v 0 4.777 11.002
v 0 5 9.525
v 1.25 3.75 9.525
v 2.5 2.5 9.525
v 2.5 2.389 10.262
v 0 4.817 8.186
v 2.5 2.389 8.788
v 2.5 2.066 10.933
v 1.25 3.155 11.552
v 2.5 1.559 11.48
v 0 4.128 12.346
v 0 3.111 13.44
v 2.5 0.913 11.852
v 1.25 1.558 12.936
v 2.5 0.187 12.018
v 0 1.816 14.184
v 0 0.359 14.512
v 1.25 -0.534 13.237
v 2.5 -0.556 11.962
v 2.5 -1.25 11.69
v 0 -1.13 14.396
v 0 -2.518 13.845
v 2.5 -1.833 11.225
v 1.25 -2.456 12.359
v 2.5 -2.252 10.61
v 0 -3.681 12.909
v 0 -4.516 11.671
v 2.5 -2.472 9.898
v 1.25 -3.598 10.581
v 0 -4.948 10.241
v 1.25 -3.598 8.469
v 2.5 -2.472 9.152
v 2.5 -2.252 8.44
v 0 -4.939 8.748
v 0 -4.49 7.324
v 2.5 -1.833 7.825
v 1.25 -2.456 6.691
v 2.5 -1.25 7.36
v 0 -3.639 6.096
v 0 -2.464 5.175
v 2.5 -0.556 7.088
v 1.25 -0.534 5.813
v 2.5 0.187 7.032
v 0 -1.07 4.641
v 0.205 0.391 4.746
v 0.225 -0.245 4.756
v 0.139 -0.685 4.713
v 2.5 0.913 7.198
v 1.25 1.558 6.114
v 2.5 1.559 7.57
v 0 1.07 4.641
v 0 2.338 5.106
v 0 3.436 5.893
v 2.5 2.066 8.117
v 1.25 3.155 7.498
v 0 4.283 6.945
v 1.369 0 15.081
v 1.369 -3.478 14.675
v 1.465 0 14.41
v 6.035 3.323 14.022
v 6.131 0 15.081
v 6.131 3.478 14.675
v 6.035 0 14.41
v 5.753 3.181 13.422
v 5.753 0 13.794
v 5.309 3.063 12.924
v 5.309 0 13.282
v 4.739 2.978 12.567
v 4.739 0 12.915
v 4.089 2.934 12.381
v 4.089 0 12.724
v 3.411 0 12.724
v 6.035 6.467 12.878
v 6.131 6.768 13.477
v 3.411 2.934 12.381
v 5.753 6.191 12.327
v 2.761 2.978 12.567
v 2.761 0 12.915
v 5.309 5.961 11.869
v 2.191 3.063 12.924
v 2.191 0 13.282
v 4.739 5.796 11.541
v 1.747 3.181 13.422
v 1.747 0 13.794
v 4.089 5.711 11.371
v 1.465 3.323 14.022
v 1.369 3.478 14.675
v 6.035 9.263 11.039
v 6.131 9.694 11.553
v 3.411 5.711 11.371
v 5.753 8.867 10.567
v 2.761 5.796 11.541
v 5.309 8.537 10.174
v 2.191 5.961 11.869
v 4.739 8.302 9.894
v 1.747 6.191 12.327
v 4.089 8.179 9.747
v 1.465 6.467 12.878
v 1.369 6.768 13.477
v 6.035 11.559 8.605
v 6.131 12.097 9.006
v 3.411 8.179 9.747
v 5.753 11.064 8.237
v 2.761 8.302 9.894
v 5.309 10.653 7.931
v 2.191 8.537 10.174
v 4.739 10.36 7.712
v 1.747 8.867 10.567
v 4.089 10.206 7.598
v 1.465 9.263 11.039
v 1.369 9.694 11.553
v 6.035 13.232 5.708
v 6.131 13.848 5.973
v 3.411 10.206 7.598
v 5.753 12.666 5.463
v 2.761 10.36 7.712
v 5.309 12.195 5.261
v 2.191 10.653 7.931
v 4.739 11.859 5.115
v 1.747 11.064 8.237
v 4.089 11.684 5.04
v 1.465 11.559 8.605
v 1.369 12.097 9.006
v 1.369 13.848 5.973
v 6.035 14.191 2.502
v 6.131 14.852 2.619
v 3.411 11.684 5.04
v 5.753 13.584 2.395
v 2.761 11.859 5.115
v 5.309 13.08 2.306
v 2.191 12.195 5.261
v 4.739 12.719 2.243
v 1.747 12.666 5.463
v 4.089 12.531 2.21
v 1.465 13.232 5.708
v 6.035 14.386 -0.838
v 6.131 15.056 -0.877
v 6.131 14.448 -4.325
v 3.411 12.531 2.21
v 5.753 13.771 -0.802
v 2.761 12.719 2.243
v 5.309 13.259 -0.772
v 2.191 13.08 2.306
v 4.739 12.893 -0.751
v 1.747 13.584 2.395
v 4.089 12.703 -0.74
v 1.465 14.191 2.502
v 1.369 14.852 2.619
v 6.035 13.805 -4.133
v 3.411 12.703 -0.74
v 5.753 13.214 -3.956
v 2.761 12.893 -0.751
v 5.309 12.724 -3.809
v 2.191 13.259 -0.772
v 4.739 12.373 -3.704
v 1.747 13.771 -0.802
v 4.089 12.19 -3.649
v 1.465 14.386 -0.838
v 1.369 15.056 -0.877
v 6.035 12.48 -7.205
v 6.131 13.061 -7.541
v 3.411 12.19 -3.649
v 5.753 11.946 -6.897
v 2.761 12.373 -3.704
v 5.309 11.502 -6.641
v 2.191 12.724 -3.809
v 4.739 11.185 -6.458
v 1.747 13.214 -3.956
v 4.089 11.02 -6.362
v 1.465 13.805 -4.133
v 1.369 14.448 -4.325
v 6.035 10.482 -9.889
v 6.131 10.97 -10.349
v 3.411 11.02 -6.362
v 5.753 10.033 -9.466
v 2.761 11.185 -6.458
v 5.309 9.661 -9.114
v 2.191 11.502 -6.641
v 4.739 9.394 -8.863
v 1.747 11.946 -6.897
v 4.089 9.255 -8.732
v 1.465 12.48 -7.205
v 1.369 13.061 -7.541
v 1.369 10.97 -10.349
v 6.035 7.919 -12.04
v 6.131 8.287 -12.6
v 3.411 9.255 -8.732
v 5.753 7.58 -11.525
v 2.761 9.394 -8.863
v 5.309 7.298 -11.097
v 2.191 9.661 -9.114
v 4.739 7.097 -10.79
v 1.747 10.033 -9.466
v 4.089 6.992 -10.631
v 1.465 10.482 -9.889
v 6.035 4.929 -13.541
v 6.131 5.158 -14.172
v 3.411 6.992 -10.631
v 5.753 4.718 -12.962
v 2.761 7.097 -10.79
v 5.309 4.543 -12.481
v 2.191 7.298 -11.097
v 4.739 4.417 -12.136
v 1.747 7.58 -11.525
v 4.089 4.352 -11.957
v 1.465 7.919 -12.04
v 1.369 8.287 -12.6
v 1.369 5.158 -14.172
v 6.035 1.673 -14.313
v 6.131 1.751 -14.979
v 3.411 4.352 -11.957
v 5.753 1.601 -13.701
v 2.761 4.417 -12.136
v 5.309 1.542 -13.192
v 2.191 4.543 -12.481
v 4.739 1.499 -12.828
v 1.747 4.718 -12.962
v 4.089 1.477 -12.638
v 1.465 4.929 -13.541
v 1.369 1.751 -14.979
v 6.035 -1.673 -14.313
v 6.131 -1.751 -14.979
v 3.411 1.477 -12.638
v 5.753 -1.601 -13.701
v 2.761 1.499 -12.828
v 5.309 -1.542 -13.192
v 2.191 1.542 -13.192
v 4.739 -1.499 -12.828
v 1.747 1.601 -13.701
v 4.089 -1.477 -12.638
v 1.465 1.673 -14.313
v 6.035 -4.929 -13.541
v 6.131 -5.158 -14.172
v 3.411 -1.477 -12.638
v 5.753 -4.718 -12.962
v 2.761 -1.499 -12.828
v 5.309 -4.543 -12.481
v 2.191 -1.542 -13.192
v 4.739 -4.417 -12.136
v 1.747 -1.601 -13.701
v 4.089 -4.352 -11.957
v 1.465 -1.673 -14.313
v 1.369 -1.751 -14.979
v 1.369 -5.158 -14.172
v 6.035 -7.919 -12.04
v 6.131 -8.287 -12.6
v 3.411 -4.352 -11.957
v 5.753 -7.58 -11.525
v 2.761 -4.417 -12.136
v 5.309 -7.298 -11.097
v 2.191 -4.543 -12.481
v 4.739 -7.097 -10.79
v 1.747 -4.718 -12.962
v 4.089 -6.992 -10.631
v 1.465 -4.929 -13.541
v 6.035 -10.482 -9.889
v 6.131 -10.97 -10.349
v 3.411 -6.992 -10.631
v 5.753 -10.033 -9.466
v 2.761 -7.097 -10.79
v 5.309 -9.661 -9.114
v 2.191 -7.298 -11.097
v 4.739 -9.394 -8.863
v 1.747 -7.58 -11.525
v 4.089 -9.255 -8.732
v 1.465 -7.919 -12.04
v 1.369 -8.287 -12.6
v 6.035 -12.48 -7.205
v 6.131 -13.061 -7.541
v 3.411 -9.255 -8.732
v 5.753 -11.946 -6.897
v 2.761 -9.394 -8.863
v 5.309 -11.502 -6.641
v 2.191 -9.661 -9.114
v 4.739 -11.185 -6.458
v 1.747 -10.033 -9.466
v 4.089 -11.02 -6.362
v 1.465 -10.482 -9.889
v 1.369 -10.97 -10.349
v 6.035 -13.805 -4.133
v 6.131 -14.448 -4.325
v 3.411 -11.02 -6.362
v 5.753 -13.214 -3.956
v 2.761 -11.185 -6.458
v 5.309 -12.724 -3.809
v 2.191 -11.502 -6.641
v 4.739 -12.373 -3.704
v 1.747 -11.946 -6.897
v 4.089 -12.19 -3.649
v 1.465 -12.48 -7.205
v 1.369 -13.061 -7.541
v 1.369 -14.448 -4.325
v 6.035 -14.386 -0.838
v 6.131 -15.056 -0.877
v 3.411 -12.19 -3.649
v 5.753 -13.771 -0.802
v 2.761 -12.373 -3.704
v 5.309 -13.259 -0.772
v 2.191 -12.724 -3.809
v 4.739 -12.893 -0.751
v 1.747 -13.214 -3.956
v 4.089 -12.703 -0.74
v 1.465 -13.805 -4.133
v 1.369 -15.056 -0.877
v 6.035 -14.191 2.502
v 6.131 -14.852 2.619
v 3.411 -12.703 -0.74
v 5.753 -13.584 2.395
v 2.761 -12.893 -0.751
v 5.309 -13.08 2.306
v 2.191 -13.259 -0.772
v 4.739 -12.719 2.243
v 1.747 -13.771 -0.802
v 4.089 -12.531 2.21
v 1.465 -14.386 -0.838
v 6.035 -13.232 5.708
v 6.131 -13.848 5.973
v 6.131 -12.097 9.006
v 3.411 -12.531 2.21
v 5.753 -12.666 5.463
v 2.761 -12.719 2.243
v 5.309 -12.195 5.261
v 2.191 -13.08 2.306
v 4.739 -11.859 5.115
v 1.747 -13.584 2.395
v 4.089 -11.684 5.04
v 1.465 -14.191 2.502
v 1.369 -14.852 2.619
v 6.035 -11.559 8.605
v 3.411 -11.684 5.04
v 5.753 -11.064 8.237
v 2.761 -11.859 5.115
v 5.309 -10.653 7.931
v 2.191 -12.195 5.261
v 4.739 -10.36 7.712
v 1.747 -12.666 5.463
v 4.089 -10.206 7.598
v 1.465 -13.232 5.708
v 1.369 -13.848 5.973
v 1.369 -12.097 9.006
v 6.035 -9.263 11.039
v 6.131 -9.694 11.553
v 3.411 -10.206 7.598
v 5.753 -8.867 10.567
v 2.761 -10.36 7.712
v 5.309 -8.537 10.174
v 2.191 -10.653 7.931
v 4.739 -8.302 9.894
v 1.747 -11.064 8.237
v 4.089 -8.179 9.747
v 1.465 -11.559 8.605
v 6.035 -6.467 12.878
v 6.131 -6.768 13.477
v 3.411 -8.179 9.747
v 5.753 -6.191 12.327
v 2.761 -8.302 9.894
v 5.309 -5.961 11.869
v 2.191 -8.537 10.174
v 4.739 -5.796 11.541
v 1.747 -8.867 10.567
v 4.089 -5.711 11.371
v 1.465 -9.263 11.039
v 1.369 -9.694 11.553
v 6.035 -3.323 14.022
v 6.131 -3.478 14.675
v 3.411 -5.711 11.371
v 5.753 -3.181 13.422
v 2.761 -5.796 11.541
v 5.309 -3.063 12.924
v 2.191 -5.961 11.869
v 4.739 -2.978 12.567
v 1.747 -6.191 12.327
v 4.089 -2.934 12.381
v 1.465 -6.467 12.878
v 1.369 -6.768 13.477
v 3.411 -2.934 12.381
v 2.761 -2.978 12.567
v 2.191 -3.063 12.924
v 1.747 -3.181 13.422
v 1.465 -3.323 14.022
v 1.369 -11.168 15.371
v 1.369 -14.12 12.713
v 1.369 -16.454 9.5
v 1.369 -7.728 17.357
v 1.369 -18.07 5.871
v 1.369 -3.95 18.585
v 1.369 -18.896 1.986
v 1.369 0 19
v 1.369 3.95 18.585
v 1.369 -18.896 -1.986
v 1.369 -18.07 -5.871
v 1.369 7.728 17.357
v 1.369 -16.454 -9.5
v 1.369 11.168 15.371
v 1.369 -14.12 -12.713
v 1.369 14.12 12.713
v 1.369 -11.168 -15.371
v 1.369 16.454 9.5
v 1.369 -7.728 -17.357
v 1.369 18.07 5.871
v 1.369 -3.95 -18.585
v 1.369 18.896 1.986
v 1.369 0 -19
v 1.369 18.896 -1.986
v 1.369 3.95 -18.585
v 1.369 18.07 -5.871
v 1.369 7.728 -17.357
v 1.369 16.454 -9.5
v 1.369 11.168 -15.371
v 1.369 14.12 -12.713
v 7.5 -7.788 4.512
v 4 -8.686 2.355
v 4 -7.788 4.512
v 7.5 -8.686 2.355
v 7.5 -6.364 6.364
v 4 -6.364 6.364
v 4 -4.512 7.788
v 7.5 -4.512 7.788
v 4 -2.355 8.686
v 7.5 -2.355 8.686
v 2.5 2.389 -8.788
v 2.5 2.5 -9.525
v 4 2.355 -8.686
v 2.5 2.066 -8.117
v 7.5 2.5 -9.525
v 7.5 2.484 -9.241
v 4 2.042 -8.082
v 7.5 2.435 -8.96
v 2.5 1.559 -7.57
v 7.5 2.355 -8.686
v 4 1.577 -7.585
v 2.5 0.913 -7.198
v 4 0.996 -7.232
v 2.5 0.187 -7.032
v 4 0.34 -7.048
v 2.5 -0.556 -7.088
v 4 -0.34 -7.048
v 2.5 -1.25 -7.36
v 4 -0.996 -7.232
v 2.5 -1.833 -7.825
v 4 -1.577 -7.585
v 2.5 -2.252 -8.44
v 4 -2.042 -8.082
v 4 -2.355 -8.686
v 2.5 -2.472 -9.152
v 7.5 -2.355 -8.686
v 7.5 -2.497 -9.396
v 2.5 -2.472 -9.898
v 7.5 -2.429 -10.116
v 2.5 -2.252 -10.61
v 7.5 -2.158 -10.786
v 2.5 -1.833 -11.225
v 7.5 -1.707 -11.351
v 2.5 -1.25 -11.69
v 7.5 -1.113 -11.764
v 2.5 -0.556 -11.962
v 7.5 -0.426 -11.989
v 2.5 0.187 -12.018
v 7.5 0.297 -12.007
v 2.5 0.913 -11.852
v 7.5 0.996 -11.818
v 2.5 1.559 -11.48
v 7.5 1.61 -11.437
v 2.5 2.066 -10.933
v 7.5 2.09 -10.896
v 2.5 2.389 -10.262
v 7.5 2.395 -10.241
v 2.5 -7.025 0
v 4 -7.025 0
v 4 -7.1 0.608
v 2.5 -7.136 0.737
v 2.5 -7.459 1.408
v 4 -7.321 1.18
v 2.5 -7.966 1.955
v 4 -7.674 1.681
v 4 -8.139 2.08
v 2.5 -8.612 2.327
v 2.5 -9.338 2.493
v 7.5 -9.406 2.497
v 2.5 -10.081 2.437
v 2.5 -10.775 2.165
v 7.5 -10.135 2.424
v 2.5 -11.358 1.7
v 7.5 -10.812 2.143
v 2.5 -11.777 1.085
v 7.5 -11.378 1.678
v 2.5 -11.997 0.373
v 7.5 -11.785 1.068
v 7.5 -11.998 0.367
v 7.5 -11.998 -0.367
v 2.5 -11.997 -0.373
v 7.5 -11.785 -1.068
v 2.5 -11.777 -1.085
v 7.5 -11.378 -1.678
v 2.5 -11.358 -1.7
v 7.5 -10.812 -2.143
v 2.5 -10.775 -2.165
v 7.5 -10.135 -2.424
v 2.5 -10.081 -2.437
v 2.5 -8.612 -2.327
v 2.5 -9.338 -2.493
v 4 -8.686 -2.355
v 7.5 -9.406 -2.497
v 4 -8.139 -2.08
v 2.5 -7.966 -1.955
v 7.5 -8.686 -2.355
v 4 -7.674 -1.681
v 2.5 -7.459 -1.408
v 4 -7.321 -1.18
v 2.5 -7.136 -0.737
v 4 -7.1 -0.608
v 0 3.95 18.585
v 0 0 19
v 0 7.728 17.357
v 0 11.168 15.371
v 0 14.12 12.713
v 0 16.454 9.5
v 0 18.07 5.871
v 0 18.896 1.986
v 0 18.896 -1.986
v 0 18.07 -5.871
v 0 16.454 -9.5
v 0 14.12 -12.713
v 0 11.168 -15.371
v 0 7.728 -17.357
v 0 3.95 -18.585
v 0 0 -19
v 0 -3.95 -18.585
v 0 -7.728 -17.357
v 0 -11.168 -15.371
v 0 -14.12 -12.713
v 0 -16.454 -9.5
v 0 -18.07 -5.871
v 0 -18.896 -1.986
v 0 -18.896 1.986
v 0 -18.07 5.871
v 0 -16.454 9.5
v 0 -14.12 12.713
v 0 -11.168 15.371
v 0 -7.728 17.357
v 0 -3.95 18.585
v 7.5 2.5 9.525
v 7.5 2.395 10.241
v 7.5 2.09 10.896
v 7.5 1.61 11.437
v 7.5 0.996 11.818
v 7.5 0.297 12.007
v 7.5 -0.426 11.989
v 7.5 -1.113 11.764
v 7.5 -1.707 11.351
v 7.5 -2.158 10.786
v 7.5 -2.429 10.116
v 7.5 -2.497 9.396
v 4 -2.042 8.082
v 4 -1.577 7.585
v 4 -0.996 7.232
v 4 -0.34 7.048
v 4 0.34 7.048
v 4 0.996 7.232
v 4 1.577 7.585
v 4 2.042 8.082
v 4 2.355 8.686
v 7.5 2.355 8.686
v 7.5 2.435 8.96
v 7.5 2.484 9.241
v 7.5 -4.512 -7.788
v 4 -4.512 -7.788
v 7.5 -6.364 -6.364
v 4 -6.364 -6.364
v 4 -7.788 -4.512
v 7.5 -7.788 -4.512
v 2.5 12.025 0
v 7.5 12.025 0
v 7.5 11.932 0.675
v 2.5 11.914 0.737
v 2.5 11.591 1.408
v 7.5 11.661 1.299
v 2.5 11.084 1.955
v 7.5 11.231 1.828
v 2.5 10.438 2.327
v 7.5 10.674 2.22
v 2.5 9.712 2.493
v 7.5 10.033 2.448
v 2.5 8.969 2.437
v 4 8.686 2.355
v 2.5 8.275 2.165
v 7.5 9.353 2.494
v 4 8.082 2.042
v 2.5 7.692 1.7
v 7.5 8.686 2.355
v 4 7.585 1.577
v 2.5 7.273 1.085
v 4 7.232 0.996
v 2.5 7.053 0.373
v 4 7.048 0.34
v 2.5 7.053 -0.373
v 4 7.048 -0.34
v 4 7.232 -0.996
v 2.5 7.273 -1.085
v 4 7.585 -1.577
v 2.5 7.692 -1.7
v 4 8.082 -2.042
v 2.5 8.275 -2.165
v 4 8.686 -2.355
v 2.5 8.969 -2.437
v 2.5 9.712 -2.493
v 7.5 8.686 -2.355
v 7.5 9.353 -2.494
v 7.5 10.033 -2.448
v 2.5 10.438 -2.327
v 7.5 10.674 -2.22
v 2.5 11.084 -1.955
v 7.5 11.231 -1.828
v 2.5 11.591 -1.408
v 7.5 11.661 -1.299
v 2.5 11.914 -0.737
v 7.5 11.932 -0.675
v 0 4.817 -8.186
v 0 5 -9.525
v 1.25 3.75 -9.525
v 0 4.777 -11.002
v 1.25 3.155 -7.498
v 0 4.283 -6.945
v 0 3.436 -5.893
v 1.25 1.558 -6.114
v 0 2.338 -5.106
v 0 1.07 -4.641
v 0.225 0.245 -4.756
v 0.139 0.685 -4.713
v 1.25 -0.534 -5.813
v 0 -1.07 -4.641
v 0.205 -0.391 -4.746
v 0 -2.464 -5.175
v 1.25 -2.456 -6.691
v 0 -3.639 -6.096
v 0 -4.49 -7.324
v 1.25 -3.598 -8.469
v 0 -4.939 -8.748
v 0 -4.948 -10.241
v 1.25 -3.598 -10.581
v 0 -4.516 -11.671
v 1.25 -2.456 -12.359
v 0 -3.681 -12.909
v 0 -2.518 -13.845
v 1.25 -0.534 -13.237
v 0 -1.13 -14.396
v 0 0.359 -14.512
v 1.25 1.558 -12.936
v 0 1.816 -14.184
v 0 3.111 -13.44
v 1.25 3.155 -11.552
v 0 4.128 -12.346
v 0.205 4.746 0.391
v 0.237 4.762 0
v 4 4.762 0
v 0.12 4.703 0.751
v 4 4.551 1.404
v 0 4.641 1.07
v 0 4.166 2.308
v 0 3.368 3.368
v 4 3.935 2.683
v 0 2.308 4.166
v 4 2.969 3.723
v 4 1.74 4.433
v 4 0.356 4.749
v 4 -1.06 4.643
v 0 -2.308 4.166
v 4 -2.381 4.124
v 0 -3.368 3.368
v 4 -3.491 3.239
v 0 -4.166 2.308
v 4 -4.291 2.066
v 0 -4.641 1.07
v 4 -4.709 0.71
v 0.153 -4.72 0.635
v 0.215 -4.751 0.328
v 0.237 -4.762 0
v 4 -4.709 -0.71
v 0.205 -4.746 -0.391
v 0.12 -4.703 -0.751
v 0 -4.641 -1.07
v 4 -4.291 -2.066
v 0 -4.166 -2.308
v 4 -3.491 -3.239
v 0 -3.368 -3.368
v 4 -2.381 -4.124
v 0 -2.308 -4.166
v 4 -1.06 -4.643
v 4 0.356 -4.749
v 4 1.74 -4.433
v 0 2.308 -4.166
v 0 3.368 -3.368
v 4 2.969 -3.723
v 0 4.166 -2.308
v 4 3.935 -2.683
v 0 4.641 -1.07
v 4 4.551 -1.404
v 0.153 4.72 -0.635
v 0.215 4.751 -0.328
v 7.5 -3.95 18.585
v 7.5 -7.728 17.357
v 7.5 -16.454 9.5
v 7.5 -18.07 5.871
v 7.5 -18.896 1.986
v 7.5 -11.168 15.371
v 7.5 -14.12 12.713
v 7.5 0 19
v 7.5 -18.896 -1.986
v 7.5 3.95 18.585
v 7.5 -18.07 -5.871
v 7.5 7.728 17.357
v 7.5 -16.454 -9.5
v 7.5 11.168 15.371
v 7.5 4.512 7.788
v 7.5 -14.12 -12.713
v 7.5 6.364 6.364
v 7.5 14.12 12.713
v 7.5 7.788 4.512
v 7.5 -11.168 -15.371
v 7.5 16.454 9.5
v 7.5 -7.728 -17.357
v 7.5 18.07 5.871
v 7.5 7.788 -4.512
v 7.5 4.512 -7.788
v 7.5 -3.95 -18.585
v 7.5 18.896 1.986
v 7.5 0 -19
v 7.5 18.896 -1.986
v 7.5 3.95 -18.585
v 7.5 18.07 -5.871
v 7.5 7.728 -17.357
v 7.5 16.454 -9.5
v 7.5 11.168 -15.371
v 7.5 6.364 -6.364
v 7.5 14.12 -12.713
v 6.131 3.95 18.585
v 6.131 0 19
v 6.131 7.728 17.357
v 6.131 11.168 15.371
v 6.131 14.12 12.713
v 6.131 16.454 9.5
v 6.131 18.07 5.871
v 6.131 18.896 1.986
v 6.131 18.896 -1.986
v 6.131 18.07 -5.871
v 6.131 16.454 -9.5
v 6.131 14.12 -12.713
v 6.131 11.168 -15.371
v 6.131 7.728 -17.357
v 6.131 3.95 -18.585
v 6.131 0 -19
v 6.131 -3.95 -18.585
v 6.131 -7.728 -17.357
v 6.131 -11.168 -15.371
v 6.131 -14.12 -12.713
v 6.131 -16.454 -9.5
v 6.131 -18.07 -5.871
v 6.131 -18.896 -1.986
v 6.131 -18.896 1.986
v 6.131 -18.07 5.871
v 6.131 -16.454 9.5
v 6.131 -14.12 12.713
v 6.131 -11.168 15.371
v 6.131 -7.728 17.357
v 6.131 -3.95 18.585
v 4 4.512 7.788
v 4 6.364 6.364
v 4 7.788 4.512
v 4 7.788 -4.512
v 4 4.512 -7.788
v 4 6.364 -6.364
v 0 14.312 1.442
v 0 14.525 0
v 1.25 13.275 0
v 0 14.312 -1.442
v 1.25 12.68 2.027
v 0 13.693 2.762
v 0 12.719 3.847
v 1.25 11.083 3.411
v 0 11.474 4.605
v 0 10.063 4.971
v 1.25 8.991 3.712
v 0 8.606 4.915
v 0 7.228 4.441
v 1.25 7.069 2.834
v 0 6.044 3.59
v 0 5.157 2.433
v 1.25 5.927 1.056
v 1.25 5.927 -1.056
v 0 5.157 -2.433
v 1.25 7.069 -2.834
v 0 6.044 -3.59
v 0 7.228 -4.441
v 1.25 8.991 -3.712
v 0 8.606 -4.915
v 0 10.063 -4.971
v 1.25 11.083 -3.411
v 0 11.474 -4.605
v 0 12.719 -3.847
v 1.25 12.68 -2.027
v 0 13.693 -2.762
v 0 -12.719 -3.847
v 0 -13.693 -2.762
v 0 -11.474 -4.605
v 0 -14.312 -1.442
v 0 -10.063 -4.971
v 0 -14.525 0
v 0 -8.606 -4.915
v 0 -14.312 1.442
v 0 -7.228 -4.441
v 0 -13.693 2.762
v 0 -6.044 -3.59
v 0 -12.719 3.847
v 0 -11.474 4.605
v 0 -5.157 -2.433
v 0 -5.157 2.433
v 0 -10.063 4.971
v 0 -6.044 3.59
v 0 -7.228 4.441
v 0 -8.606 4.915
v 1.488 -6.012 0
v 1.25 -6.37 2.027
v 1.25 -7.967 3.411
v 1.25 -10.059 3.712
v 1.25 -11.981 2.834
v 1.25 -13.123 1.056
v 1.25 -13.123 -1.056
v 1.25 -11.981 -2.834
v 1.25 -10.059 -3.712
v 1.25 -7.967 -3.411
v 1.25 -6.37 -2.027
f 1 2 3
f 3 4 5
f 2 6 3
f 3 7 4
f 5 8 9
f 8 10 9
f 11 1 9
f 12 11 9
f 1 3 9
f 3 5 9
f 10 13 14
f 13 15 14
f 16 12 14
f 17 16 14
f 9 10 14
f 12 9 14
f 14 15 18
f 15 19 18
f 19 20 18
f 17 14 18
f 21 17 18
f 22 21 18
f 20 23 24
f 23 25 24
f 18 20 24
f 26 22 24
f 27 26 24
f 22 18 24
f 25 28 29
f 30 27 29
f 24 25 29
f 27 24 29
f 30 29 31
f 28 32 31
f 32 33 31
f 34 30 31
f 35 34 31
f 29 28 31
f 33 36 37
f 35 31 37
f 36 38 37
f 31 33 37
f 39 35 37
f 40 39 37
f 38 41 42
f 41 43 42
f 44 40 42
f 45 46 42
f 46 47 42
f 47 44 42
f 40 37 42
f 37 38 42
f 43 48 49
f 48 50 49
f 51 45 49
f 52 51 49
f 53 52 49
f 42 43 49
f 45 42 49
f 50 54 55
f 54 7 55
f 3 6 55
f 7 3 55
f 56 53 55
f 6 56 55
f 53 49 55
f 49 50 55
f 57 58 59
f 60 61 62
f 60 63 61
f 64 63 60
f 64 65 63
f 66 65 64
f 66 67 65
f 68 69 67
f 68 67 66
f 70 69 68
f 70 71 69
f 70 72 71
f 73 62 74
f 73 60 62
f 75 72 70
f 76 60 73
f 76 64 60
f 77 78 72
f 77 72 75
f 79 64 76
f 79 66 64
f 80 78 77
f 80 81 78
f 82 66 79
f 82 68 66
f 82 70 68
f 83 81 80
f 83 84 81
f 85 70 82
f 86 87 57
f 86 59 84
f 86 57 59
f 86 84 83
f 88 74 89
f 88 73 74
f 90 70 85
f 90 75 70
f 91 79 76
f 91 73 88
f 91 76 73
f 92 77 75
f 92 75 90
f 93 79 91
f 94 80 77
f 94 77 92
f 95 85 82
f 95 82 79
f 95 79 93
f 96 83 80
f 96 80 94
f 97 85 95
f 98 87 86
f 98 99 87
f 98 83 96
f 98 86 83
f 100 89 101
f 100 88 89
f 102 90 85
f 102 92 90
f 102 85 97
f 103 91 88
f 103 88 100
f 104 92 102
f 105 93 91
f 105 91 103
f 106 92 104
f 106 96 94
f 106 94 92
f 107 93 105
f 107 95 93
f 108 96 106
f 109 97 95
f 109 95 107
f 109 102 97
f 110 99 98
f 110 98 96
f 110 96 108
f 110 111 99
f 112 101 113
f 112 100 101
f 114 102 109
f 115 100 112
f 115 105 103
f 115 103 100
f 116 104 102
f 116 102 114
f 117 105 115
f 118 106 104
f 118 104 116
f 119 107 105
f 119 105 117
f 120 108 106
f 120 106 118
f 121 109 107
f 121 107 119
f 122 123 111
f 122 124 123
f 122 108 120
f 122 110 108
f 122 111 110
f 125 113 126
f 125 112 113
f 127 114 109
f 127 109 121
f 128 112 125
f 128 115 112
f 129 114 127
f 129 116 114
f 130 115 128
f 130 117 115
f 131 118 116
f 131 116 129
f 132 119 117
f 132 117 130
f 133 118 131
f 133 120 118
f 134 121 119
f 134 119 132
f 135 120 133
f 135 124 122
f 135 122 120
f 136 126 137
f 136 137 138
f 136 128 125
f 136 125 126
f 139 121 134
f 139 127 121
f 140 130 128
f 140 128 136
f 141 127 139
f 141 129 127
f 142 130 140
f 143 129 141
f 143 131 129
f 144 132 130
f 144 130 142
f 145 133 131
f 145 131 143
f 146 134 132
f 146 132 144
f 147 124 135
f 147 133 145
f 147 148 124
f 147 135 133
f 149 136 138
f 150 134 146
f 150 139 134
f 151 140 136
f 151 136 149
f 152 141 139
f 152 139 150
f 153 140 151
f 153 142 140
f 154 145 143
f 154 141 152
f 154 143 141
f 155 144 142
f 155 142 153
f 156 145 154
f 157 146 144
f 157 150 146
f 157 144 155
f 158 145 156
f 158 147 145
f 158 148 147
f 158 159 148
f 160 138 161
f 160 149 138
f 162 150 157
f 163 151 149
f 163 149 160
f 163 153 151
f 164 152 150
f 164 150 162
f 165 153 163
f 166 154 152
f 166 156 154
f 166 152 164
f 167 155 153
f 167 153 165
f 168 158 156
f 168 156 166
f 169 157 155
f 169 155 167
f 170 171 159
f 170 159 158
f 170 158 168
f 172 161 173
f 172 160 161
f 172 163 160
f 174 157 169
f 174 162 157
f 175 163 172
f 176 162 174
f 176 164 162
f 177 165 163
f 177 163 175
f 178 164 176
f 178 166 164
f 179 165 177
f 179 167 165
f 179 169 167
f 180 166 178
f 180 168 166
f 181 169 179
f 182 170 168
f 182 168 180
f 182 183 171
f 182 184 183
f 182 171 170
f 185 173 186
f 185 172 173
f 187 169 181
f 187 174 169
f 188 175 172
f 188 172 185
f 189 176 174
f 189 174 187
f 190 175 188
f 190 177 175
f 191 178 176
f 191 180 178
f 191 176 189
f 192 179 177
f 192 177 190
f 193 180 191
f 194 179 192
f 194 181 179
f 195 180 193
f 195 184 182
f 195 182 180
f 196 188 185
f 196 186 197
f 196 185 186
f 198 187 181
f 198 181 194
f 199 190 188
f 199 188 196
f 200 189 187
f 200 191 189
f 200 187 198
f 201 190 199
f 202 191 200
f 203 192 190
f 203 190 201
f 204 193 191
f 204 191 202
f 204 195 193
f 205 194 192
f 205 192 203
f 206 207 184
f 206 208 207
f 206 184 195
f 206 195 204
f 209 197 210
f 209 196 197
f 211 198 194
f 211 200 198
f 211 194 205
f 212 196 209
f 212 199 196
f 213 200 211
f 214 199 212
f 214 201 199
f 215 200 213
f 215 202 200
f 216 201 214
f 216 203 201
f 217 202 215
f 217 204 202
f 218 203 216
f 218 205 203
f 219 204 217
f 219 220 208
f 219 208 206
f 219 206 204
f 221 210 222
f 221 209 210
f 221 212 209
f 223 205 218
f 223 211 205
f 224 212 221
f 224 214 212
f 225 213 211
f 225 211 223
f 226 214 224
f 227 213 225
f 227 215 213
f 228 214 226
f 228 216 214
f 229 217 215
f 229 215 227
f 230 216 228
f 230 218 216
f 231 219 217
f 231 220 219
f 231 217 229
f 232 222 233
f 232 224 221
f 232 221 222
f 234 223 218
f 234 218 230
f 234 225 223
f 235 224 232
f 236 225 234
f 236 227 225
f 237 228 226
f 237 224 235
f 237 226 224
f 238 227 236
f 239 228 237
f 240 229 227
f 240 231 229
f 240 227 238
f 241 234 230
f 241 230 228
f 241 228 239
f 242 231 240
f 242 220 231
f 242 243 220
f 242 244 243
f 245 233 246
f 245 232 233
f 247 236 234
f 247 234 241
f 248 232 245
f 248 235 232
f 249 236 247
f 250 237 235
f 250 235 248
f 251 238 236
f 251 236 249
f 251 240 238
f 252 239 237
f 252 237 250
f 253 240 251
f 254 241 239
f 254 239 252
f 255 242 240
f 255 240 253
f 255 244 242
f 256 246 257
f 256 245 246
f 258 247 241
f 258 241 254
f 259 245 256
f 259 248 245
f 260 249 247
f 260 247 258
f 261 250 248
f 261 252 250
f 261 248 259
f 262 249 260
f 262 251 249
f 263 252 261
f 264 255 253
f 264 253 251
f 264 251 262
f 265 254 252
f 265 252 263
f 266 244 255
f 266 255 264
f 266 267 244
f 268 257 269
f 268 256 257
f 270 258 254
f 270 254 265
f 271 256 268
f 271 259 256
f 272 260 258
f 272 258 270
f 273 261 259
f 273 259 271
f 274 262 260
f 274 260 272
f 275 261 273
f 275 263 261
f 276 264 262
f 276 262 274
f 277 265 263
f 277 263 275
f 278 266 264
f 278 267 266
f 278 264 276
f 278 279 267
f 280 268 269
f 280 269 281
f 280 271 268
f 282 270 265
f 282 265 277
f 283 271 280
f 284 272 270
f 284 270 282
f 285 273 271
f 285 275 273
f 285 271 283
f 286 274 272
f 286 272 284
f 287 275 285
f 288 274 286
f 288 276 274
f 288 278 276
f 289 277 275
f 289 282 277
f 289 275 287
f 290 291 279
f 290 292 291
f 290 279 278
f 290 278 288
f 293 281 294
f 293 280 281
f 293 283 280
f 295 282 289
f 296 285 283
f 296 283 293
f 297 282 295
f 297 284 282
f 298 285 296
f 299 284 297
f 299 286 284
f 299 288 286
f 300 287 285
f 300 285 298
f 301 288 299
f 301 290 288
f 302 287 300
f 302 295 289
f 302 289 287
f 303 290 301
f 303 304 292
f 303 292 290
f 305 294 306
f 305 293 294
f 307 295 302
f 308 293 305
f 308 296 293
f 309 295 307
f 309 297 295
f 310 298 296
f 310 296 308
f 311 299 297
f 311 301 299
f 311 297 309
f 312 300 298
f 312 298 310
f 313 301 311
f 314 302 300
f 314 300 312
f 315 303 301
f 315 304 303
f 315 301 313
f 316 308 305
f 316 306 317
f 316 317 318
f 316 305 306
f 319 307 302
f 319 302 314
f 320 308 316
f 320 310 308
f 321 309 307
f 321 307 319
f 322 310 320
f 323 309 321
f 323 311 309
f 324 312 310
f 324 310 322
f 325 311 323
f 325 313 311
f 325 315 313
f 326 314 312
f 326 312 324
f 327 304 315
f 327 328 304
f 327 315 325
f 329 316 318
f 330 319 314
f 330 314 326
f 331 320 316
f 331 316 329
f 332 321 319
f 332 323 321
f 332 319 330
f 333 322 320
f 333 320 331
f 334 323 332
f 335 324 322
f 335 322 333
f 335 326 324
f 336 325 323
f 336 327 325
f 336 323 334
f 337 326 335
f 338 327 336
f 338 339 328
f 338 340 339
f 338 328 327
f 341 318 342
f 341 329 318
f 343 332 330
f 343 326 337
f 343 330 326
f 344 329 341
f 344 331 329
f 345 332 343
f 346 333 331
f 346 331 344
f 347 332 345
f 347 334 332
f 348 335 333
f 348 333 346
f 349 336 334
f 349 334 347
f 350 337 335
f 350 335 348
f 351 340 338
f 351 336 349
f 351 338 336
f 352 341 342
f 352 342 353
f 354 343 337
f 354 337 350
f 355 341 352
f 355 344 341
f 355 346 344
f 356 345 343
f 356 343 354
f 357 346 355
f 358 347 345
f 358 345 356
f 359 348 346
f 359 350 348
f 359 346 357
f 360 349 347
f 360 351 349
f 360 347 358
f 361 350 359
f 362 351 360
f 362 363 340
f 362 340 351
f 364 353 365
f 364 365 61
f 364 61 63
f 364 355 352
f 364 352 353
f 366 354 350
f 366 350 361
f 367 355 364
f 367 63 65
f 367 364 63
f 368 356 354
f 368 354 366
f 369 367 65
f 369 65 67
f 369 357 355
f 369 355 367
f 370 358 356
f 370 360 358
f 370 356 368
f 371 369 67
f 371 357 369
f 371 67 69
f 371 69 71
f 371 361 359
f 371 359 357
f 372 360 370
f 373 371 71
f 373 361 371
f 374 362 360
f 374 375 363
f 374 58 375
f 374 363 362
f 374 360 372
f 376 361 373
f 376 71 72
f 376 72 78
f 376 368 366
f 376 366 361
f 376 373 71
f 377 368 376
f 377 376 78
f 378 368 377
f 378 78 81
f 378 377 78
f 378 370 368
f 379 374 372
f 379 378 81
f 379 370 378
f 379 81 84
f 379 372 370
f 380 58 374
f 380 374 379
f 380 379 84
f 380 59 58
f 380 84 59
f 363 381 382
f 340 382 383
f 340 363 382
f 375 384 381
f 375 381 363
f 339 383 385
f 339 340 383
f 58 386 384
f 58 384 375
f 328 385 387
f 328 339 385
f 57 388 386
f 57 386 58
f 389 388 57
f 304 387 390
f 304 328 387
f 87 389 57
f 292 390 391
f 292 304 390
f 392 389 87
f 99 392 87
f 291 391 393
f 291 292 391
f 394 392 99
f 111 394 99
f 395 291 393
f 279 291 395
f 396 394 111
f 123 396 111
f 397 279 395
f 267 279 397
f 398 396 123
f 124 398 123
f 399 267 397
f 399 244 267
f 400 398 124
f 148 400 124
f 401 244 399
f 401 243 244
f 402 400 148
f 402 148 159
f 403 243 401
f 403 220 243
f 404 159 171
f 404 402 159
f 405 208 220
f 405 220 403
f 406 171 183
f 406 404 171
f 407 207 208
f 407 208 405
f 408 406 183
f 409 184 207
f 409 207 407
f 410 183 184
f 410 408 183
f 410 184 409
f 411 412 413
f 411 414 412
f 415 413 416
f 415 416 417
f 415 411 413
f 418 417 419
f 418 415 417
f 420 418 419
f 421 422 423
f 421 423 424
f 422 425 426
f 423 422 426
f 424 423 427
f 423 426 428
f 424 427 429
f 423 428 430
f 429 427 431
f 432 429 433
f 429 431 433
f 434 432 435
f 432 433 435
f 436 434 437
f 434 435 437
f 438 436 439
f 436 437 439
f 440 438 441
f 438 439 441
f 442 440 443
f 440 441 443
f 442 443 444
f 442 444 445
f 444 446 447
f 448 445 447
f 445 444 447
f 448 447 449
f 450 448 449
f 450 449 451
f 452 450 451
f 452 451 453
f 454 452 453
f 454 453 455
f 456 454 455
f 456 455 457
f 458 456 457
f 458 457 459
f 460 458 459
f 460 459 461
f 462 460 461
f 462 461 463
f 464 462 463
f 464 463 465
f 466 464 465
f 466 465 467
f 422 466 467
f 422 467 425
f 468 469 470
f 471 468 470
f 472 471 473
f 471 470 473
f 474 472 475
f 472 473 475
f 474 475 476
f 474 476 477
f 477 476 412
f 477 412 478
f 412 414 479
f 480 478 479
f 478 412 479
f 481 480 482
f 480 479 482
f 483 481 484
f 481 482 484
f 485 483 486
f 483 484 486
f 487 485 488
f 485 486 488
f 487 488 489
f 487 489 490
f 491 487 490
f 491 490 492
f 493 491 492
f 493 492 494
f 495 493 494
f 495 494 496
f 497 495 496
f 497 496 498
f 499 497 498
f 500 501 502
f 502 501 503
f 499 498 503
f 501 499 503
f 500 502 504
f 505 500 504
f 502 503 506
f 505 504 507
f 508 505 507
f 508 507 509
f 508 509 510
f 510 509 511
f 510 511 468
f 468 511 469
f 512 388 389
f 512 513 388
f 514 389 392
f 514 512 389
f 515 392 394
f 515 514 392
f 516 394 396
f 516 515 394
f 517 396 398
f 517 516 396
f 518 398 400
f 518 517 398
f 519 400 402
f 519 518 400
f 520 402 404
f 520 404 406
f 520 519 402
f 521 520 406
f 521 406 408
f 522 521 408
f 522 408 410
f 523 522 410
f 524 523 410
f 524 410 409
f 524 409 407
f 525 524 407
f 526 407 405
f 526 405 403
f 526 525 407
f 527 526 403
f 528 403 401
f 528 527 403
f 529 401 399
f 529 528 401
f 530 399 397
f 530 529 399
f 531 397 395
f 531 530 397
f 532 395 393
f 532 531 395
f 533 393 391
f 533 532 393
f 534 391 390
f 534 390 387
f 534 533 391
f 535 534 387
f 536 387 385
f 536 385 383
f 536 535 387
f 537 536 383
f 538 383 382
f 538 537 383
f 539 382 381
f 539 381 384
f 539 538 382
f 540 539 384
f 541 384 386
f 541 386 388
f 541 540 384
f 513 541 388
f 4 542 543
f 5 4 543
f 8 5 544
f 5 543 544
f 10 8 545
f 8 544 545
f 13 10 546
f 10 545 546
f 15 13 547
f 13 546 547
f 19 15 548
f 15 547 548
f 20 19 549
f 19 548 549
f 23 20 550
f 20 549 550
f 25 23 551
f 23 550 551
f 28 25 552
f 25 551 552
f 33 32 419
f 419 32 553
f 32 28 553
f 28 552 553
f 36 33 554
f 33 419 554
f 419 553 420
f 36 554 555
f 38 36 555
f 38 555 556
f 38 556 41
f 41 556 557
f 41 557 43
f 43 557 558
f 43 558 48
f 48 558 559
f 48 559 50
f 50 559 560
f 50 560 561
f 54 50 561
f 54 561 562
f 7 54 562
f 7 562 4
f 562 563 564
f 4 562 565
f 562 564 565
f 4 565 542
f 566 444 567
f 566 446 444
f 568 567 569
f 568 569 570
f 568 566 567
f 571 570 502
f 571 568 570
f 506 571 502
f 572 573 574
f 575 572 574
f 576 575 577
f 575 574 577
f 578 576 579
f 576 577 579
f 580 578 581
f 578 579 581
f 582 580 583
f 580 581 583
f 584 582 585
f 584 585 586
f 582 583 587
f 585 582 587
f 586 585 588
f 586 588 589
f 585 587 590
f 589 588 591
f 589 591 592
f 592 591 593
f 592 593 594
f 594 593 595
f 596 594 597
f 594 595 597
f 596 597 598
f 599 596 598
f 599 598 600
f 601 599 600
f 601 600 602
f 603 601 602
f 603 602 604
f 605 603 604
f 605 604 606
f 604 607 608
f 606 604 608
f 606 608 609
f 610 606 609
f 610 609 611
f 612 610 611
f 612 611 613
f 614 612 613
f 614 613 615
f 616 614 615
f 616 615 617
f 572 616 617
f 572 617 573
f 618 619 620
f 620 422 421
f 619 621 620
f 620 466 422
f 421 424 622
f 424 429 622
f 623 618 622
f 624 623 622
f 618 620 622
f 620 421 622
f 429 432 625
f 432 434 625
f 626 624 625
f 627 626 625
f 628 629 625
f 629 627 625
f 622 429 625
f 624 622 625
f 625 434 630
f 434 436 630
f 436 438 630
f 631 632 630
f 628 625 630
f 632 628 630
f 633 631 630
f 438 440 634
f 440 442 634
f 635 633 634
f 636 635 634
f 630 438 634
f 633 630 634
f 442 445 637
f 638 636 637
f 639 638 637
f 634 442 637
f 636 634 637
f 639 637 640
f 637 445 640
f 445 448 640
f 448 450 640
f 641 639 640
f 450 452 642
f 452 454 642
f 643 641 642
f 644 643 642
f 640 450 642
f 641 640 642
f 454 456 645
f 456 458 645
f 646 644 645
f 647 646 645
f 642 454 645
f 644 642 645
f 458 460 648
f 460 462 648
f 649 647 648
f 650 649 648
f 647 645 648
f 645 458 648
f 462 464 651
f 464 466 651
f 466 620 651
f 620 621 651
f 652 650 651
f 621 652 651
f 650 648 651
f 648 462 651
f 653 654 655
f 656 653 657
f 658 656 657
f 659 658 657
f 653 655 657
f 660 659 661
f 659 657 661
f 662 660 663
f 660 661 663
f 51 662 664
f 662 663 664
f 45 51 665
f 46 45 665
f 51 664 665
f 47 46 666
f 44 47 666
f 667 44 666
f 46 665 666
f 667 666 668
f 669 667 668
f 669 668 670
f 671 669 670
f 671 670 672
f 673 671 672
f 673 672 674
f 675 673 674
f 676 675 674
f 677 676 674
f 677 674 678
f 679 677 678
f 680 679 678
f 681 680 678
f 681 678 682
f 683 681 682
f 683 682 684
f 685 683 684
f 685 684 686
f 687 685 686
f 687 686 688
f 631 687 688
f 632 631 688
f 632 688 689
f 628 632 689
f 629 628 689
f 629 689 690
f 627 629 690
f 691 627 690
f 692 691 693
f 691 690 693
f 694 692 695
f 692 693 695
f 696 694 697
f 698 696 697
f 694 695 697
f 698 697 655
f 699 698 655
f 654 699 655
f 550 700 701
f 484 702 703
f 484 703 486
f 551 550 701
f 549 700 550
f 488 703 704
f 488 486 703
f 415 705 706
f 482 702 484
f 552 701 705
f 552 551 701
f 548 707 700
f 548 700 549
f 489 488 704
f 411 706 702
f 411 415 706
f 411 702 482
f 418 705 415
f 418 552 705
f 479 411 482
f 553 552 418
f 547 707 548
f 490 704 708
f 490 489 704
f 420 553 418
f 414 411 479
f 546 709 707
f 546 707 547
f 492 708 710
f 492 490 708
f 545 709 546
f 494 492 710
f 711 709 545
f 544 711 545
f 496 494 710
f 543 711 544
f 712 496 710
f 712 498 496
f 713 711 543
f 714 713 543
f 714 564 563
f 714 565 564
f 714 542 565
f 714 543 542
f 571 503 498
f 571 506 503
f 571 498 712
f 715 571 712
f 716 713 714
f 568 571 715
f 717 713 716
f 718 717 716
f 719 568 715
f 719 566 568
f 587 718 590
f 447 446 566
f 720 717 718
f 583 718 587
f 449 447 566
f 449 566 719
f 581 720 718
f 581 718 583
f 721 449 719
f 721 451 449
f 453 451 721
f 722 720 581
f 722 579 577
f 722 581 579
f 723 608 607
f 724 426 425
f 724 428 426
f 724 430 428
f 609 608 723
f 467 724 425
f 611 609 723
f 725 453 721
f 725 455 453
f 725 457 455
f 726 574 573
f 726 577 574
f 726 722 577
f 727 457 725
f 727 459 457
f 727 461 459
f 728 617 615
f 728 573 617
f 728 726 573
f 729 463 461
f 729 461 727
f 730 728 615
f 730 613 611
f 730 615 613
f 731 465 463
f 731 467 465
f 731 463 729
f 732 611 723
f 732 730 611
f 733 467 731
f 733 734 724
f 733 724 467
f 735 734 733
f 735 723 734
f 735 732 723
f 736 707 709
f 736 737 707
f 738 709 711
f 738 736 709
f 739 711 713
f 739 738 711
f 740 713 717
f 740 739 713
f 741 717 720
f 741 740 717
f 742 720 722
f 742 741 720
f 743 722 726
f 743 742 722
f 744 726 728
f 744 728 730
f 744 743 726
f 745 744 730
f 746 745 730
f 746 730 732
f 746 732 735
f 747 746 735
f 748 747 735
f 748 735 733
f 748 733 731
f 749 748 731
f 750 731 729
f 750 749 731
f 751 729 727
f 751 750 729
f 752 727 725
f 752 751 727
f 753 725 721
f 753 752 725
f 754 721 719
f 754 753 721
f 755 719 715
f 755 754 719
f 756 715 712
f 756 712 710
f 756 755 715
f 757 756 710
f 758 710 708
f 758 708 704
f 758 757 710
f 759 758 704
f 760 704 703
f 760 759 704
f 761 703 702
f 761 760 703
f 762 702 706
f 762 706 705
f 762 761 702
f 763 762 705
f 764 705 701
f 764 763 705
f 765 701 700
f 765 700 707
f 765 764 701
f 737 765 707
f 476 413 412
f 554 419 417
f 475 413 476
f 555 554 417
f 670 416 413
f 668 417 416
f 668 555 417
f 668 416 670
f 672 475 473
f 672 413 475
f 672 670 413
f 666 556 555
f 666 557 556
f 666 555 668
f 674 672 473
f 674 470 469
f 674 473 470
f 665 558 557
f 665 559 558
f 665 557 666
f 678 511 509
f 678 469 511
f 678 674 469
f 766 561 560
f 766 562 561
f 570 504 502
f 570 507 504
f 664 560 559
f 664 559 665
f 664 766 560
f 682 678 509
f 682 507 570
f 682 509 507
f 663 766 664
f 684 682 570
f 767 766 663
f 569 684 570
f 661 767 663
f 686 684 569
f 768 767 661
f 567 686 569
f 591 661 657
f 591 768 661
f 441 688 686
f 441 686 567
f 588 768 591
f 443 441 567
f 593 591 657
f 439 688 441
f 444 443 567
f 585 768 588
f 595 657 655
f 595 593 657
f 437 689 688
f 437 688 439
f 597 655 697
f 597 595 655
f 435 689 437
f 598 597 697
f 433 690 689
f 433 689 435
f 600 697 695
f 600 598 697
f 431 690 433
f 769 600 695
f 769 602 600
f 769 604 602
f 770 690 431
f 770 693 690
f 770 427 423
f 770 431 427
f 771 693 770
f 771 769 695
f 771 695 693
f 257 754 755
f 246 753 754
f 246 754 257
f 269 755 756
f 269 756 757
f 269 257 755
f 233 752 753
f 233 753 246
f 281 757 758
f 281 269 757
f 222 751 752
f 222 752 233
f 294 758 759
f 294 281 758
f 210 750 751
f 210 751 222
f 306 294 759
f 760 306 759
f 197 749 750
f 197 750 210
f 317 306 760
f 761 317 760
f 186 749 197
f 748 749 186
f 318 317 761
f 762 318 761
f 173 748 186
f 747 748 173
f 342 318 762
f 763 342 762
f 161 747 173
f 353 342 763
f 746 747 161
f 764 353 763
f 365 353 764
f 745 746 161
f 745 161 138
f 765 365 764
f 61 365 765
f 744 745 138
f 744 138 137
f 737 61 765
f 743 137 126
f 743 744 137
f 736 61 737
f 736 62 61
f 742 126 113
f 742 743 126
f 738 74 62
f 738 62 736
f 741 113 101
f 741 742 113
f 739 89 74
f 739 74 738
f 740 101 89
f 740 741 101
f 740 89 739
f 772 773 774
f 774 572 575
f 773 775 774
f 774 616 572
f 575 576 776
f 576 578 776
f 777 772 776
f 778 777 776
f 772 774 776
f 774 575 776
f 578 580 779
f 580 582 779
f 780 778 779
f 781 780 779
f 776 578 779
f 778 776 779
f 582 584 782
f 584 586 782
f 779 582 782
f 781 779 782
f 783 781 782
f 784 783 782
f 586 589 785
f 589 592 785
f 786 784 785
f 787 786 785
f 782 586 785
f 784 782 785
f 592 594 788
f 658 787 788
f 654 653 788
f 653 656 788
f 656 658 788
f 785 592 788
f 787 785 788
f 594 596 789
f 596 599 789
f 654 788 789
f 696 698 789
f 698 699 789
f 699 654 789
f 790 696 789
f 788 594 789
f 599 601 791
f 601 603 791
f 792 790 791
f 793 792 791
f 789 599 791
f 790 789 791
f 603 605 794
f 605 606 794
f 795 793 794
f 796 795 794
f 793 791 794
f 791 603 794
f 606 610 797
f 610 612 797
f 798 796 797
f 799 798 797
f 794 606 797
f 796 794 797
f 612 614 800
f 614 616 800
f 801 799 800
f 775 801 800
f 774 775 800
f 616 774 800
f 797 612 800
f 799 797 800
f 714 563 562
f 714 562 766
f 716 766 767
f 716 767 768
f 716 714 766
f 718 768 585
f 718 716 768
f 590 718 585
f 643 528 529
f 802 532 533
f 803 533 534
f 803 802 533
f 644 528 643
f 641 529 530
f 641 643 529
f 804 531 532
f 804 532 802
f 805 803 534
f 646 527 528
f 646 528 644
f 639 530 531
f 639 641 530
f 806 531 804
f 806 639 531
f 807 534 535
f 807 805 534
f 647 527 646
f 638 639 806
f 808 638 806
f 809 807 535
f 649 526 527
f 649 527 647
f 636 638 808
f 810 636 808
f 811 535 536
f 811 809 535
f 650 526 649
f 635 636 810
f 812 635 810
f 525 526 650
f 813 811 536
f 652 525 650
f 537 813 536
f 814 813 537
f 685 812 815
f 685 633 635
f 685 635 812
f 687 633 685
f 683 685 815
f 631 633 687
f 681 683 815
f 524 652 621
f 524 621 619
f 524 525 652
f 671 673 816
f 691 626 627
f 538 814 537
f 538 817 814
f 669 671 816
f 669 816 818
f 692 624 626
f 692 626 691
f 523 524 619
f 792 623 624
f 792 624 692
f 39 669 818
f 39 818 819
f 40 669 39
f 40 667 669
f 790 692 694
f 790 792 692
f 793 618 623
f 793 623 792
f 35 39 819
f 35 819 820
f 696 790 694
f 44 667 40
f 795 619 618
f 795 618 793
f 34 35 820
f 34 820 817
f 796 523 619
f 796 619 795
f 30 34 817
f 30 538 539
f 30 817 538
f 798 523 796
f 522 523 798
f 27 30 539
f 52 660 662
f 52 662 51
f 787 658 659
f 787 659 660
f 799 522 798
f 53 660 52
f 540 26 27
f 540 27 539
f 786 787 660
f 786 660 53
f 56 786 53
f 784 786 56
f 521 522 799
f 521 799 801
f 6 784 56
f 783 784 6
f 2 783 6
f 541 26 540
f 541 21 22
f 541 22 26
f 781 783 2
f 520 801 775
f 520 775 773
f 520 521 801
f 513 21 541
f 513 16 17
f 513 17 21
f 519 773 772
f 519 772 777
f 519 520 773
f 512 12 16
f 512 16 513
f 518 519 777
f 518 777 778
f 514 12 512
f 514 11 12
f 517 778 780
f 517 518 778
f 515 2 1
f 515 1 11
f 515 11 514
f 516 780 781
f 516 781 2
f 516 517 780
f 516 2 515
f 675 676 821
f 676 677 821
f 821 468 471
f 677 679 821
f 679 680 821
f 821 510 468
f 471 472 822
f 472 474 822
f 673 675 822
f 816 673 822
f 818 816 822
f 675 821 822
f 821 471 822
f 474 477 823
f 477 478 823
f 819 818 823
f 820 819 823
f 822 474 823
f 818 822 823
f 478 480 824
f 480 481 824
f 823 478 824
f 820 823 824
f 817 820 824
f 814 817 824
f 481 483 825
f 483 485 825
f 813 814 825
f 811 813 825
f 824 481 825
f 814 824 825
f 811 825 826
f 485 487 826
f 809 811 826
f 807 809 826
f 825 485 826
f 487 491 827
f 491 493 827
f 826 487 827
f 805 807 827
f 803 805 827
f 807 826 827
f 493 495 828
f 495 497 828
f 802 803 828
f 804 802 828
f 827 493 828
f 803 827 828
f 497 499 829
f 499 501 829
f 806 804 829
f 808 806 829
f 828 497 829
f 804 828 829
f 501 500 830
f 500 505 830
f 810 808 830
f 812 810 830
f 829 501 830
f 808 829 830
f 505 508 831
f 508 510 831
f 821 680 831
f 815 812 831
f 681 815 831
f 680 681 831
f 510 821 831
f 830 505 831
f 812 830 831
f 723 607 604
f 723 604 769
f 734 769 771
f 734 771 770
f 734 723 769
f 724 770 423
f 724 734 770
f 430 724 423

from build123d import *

# Parameters (mm, degrees)
F2_R           = 4.7625
F2_R_2         = 2.5
F3_DEPTH       = 7.501
F5_D           = 5
F5_CSINK_D     = 10
F5_CSINK_ANGLE = 90


with BuildPart() as f1:
    # F0 (on Front) → F1 (revolve)
    with BuildSketch(Plane.XZ):
        with BuildLine():
            Line((0, 19), (0, 0))
            Line((0, 0), (4, 0))
            Line((4, 0), (4, 9))
            Line((4, 9), (7.5, 9))
            Line((7.5, 9), (7.5, 19))
            Line((7.5, 19), (6.13125, 19))
            Line((6.13125, 19), (6.13125, 15.08125))
            ThreePointArc((6.13125, 15.08125), (3.75, 12.7), (1.36875, 15.08125))
            Line((1.36875, 15.08125), (1.36875, 19))
            Line((1.36875, 19), (0, 19))
        make_face()
    revolve(axis=Axis((2, 0, 0), (-1, 0, 0)))

    # F2 (on face) → F3 (cut, through all)
    with BuildSketch(Plane.YZ.offset(7.5)):
        Circle(F2_R)
        with Locations((0, 9.525)):
            Circle(F2_R_2)
        with Locations((9.525, 0)):
            Circle(F2_R_2)
        with Locations((0, -9.525)):
            Circle(F2_R_2)
        with Locations((-9.525, 0)):
            Circle(F2_R_2)
    extrude(amount=-F3_DEPTH, mode=Mode.SUBTRACT)

    # F5 (through all)
    with Locations(Plane(origin=(0, 0, 0), x_dir=(0, -1, 0), z_dir=(-1, 0, 0))):
        with Locations((0, 9.525), (9.525, 0), (0, -9.525), (-9.525, 0)):
            CounterSinkHole(F5_D / 2, F5_CSINK_D / 2, counter_sink_angle=F5_CSINK_ANGLE)


solid = f1.part
